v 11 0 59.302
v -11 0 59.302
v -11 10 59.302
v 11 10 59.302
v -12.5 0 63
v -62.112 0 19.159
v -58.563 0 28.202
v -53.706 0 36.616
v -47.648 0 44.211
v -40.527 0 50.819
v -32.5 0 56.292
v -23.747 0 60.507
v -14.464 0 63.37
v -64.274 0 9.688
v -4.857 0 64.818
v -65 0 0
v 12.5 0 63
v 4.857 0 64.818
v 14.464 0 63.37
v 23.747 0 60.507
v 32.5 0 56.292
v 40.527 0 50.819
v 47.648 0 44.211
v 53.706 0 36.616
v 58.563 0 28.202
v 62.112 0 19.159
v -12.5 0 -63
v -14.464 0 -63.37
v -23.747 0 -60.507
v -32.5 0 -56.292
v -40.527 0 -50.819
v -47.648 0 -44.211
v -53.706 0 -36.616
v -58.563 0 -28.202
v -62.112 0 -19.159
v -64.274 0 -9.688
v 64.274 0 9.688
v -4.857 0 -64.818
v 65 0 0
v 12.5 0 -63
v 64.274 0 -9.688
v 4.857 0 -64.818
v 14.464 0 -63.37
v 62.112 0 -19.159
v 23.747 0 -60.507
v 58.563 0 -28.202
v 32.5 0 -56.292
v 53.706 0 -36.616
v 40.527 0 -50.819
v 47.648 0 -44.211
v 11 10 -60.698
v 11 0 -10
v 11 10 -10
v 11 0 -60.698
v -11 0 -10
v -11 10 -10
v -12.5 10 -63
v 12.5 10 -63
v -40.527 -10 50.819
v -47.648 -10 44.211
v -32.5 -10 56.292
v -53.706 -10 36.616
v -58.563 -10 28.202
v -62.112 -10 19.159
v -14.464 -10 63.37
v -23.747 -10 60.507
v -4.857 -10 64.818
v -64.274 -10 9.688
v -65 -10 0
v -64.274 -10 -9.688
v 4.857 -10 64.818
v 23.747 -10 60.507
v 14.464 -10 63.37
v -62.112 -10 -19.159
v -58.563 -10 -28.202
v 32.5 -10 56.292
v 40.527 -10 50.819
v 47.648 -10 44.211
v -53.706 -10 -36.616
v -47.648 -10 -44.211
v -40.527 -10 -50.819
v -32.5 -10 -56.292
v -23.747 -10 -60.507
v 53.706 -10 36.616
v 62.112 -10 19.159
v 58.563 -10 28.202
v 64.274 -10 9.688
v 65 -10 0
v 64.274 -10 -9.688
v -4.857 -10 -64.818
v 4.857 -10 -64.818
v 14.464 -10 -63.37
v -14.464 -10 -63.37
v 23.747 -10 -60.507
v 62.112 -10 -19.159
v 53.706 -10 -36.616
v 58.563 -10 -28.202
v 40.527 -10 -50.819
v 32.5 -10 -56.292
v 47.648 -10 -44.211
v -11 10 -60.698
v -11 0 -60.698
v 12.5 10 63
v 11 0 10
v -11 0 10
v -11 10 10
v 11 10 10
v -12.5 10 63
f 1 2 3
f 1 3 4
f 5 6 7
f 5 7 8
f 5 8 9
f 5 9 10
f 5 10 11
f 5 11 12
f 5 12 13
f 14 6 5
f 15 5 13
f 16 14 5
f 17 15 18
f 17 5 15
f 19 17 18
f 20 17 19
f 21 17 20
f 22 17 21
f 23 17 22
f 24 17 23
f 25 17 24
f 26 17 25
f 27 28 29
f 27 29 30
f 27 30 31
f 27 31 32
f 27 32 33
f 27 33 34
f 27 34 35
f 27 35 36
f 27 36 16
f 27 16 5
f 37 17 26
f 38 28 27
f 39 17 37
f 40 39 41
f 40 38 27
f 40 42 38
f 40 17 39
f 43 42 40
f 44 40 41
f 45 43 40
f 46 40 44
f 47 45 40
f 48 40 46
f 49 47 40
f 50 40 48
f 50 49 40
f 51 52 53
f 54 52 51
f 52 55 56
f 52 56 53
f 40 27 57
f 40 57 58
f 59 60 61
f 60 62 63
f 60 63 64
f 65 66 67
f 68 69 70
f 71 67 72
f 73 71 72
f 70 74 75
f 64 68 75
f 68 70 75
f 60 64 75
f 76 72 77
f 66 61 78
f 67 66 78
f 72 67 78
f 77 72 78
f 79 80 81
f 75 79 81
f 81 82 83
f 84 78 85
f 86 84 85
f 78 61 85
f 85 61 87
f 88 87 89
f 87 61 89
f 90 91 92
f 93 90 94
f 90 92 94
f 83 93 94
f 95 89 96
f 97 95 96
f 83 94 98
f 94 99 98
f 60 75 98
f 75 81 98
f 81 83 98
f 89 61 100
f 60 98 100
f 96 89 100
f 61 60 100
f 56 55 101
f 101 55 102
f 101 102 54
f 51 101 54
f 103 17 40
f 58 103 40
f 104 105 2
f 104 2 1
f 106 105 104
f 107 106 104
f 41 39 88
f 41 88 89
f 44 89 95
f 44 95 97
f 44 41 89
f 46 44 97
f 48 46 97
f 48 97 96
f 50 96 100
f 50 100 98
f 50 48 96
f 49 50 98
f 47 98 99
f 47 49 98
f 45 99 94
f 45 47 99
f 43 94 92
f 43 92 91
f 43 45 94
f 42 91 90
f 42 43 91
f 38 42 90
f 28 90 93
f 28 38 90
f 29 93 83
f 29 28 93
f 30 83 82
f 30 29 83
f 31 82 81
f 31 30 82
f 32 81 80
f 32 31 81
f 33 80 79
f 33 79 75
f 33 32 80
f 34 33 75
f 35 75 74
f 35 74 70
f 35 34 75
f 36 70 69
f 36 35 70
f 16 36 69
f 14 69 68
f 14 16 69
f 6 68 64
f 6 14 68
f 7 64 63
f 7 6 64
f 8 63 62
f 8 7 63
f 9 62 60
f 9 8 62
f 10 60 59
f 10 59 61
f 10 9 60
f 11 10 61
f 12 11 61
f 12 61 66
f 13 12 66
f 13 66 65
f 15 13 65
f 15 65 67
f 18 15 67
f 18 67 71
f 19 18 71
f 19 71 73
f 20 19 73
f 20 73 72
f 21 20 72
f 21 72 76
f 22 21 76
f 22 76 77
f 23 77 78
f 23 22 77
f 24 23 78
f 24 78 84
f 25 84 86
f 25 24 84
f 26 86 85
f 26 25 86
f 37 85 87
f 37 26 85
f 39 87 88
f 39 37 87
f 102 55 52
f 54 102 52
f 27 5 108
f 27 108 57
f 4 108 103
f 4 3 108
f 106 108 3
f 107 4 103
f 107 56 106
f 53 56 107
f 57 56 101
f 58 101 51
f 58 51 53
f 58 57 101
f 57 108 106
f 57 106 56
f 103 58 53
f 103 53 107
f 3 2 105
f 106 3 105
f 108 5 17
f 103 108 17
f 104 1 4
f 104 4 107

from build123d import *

# Parameters (mm, degrees)
SKETCH1_W           = 25
SKETCH1_H           = 126
SKETCH1_W_2         = 22
SKETCH1_H_2         = 50.698113208
SKETCH1_H_3         = 49.301886792
BOSS_EXTRUDE1_DEPTH = 10
SKETCH2_R           = 65
BOSS_EXTRUDE2_DEPTH = 10


with BuildPart() as part:
    # Sketch1 → Boss-Extrude1 (new body)
    with BuildSketch(Plane(origin=(0, 0, 0), x_dir=(1, 0, 0), z_dir=(0, 1, 0))):
        Rectangle(SKETCH1_W, SKETCH1_H)
        with Locations((0, 35.349056604)):
            Rectangle(SKETCH1_W_2, SKETCH1_H_2, mode=Mode.SUBTRACT)
        with Locations((0, -34.650943396)):
            Rectangle(SKETCH1_W_2, SKETCH1_H_3, mode=Mode.SUBTRACT)
    extrude(amount=BOSS_EXTRUDE1_DEPTH)

    # Sketch2 → Boss-Extrude2 (add)
    with BuildSketch(Plane(origin=(0, 0, 0), x_dir=(1, 0, 0), z_dir=(0, 1, 0))):
        Circle(SKETCH2_R)
    extrude(amount=-BOSS_EXTRUDE2_DEPTH)


solid = part.part
